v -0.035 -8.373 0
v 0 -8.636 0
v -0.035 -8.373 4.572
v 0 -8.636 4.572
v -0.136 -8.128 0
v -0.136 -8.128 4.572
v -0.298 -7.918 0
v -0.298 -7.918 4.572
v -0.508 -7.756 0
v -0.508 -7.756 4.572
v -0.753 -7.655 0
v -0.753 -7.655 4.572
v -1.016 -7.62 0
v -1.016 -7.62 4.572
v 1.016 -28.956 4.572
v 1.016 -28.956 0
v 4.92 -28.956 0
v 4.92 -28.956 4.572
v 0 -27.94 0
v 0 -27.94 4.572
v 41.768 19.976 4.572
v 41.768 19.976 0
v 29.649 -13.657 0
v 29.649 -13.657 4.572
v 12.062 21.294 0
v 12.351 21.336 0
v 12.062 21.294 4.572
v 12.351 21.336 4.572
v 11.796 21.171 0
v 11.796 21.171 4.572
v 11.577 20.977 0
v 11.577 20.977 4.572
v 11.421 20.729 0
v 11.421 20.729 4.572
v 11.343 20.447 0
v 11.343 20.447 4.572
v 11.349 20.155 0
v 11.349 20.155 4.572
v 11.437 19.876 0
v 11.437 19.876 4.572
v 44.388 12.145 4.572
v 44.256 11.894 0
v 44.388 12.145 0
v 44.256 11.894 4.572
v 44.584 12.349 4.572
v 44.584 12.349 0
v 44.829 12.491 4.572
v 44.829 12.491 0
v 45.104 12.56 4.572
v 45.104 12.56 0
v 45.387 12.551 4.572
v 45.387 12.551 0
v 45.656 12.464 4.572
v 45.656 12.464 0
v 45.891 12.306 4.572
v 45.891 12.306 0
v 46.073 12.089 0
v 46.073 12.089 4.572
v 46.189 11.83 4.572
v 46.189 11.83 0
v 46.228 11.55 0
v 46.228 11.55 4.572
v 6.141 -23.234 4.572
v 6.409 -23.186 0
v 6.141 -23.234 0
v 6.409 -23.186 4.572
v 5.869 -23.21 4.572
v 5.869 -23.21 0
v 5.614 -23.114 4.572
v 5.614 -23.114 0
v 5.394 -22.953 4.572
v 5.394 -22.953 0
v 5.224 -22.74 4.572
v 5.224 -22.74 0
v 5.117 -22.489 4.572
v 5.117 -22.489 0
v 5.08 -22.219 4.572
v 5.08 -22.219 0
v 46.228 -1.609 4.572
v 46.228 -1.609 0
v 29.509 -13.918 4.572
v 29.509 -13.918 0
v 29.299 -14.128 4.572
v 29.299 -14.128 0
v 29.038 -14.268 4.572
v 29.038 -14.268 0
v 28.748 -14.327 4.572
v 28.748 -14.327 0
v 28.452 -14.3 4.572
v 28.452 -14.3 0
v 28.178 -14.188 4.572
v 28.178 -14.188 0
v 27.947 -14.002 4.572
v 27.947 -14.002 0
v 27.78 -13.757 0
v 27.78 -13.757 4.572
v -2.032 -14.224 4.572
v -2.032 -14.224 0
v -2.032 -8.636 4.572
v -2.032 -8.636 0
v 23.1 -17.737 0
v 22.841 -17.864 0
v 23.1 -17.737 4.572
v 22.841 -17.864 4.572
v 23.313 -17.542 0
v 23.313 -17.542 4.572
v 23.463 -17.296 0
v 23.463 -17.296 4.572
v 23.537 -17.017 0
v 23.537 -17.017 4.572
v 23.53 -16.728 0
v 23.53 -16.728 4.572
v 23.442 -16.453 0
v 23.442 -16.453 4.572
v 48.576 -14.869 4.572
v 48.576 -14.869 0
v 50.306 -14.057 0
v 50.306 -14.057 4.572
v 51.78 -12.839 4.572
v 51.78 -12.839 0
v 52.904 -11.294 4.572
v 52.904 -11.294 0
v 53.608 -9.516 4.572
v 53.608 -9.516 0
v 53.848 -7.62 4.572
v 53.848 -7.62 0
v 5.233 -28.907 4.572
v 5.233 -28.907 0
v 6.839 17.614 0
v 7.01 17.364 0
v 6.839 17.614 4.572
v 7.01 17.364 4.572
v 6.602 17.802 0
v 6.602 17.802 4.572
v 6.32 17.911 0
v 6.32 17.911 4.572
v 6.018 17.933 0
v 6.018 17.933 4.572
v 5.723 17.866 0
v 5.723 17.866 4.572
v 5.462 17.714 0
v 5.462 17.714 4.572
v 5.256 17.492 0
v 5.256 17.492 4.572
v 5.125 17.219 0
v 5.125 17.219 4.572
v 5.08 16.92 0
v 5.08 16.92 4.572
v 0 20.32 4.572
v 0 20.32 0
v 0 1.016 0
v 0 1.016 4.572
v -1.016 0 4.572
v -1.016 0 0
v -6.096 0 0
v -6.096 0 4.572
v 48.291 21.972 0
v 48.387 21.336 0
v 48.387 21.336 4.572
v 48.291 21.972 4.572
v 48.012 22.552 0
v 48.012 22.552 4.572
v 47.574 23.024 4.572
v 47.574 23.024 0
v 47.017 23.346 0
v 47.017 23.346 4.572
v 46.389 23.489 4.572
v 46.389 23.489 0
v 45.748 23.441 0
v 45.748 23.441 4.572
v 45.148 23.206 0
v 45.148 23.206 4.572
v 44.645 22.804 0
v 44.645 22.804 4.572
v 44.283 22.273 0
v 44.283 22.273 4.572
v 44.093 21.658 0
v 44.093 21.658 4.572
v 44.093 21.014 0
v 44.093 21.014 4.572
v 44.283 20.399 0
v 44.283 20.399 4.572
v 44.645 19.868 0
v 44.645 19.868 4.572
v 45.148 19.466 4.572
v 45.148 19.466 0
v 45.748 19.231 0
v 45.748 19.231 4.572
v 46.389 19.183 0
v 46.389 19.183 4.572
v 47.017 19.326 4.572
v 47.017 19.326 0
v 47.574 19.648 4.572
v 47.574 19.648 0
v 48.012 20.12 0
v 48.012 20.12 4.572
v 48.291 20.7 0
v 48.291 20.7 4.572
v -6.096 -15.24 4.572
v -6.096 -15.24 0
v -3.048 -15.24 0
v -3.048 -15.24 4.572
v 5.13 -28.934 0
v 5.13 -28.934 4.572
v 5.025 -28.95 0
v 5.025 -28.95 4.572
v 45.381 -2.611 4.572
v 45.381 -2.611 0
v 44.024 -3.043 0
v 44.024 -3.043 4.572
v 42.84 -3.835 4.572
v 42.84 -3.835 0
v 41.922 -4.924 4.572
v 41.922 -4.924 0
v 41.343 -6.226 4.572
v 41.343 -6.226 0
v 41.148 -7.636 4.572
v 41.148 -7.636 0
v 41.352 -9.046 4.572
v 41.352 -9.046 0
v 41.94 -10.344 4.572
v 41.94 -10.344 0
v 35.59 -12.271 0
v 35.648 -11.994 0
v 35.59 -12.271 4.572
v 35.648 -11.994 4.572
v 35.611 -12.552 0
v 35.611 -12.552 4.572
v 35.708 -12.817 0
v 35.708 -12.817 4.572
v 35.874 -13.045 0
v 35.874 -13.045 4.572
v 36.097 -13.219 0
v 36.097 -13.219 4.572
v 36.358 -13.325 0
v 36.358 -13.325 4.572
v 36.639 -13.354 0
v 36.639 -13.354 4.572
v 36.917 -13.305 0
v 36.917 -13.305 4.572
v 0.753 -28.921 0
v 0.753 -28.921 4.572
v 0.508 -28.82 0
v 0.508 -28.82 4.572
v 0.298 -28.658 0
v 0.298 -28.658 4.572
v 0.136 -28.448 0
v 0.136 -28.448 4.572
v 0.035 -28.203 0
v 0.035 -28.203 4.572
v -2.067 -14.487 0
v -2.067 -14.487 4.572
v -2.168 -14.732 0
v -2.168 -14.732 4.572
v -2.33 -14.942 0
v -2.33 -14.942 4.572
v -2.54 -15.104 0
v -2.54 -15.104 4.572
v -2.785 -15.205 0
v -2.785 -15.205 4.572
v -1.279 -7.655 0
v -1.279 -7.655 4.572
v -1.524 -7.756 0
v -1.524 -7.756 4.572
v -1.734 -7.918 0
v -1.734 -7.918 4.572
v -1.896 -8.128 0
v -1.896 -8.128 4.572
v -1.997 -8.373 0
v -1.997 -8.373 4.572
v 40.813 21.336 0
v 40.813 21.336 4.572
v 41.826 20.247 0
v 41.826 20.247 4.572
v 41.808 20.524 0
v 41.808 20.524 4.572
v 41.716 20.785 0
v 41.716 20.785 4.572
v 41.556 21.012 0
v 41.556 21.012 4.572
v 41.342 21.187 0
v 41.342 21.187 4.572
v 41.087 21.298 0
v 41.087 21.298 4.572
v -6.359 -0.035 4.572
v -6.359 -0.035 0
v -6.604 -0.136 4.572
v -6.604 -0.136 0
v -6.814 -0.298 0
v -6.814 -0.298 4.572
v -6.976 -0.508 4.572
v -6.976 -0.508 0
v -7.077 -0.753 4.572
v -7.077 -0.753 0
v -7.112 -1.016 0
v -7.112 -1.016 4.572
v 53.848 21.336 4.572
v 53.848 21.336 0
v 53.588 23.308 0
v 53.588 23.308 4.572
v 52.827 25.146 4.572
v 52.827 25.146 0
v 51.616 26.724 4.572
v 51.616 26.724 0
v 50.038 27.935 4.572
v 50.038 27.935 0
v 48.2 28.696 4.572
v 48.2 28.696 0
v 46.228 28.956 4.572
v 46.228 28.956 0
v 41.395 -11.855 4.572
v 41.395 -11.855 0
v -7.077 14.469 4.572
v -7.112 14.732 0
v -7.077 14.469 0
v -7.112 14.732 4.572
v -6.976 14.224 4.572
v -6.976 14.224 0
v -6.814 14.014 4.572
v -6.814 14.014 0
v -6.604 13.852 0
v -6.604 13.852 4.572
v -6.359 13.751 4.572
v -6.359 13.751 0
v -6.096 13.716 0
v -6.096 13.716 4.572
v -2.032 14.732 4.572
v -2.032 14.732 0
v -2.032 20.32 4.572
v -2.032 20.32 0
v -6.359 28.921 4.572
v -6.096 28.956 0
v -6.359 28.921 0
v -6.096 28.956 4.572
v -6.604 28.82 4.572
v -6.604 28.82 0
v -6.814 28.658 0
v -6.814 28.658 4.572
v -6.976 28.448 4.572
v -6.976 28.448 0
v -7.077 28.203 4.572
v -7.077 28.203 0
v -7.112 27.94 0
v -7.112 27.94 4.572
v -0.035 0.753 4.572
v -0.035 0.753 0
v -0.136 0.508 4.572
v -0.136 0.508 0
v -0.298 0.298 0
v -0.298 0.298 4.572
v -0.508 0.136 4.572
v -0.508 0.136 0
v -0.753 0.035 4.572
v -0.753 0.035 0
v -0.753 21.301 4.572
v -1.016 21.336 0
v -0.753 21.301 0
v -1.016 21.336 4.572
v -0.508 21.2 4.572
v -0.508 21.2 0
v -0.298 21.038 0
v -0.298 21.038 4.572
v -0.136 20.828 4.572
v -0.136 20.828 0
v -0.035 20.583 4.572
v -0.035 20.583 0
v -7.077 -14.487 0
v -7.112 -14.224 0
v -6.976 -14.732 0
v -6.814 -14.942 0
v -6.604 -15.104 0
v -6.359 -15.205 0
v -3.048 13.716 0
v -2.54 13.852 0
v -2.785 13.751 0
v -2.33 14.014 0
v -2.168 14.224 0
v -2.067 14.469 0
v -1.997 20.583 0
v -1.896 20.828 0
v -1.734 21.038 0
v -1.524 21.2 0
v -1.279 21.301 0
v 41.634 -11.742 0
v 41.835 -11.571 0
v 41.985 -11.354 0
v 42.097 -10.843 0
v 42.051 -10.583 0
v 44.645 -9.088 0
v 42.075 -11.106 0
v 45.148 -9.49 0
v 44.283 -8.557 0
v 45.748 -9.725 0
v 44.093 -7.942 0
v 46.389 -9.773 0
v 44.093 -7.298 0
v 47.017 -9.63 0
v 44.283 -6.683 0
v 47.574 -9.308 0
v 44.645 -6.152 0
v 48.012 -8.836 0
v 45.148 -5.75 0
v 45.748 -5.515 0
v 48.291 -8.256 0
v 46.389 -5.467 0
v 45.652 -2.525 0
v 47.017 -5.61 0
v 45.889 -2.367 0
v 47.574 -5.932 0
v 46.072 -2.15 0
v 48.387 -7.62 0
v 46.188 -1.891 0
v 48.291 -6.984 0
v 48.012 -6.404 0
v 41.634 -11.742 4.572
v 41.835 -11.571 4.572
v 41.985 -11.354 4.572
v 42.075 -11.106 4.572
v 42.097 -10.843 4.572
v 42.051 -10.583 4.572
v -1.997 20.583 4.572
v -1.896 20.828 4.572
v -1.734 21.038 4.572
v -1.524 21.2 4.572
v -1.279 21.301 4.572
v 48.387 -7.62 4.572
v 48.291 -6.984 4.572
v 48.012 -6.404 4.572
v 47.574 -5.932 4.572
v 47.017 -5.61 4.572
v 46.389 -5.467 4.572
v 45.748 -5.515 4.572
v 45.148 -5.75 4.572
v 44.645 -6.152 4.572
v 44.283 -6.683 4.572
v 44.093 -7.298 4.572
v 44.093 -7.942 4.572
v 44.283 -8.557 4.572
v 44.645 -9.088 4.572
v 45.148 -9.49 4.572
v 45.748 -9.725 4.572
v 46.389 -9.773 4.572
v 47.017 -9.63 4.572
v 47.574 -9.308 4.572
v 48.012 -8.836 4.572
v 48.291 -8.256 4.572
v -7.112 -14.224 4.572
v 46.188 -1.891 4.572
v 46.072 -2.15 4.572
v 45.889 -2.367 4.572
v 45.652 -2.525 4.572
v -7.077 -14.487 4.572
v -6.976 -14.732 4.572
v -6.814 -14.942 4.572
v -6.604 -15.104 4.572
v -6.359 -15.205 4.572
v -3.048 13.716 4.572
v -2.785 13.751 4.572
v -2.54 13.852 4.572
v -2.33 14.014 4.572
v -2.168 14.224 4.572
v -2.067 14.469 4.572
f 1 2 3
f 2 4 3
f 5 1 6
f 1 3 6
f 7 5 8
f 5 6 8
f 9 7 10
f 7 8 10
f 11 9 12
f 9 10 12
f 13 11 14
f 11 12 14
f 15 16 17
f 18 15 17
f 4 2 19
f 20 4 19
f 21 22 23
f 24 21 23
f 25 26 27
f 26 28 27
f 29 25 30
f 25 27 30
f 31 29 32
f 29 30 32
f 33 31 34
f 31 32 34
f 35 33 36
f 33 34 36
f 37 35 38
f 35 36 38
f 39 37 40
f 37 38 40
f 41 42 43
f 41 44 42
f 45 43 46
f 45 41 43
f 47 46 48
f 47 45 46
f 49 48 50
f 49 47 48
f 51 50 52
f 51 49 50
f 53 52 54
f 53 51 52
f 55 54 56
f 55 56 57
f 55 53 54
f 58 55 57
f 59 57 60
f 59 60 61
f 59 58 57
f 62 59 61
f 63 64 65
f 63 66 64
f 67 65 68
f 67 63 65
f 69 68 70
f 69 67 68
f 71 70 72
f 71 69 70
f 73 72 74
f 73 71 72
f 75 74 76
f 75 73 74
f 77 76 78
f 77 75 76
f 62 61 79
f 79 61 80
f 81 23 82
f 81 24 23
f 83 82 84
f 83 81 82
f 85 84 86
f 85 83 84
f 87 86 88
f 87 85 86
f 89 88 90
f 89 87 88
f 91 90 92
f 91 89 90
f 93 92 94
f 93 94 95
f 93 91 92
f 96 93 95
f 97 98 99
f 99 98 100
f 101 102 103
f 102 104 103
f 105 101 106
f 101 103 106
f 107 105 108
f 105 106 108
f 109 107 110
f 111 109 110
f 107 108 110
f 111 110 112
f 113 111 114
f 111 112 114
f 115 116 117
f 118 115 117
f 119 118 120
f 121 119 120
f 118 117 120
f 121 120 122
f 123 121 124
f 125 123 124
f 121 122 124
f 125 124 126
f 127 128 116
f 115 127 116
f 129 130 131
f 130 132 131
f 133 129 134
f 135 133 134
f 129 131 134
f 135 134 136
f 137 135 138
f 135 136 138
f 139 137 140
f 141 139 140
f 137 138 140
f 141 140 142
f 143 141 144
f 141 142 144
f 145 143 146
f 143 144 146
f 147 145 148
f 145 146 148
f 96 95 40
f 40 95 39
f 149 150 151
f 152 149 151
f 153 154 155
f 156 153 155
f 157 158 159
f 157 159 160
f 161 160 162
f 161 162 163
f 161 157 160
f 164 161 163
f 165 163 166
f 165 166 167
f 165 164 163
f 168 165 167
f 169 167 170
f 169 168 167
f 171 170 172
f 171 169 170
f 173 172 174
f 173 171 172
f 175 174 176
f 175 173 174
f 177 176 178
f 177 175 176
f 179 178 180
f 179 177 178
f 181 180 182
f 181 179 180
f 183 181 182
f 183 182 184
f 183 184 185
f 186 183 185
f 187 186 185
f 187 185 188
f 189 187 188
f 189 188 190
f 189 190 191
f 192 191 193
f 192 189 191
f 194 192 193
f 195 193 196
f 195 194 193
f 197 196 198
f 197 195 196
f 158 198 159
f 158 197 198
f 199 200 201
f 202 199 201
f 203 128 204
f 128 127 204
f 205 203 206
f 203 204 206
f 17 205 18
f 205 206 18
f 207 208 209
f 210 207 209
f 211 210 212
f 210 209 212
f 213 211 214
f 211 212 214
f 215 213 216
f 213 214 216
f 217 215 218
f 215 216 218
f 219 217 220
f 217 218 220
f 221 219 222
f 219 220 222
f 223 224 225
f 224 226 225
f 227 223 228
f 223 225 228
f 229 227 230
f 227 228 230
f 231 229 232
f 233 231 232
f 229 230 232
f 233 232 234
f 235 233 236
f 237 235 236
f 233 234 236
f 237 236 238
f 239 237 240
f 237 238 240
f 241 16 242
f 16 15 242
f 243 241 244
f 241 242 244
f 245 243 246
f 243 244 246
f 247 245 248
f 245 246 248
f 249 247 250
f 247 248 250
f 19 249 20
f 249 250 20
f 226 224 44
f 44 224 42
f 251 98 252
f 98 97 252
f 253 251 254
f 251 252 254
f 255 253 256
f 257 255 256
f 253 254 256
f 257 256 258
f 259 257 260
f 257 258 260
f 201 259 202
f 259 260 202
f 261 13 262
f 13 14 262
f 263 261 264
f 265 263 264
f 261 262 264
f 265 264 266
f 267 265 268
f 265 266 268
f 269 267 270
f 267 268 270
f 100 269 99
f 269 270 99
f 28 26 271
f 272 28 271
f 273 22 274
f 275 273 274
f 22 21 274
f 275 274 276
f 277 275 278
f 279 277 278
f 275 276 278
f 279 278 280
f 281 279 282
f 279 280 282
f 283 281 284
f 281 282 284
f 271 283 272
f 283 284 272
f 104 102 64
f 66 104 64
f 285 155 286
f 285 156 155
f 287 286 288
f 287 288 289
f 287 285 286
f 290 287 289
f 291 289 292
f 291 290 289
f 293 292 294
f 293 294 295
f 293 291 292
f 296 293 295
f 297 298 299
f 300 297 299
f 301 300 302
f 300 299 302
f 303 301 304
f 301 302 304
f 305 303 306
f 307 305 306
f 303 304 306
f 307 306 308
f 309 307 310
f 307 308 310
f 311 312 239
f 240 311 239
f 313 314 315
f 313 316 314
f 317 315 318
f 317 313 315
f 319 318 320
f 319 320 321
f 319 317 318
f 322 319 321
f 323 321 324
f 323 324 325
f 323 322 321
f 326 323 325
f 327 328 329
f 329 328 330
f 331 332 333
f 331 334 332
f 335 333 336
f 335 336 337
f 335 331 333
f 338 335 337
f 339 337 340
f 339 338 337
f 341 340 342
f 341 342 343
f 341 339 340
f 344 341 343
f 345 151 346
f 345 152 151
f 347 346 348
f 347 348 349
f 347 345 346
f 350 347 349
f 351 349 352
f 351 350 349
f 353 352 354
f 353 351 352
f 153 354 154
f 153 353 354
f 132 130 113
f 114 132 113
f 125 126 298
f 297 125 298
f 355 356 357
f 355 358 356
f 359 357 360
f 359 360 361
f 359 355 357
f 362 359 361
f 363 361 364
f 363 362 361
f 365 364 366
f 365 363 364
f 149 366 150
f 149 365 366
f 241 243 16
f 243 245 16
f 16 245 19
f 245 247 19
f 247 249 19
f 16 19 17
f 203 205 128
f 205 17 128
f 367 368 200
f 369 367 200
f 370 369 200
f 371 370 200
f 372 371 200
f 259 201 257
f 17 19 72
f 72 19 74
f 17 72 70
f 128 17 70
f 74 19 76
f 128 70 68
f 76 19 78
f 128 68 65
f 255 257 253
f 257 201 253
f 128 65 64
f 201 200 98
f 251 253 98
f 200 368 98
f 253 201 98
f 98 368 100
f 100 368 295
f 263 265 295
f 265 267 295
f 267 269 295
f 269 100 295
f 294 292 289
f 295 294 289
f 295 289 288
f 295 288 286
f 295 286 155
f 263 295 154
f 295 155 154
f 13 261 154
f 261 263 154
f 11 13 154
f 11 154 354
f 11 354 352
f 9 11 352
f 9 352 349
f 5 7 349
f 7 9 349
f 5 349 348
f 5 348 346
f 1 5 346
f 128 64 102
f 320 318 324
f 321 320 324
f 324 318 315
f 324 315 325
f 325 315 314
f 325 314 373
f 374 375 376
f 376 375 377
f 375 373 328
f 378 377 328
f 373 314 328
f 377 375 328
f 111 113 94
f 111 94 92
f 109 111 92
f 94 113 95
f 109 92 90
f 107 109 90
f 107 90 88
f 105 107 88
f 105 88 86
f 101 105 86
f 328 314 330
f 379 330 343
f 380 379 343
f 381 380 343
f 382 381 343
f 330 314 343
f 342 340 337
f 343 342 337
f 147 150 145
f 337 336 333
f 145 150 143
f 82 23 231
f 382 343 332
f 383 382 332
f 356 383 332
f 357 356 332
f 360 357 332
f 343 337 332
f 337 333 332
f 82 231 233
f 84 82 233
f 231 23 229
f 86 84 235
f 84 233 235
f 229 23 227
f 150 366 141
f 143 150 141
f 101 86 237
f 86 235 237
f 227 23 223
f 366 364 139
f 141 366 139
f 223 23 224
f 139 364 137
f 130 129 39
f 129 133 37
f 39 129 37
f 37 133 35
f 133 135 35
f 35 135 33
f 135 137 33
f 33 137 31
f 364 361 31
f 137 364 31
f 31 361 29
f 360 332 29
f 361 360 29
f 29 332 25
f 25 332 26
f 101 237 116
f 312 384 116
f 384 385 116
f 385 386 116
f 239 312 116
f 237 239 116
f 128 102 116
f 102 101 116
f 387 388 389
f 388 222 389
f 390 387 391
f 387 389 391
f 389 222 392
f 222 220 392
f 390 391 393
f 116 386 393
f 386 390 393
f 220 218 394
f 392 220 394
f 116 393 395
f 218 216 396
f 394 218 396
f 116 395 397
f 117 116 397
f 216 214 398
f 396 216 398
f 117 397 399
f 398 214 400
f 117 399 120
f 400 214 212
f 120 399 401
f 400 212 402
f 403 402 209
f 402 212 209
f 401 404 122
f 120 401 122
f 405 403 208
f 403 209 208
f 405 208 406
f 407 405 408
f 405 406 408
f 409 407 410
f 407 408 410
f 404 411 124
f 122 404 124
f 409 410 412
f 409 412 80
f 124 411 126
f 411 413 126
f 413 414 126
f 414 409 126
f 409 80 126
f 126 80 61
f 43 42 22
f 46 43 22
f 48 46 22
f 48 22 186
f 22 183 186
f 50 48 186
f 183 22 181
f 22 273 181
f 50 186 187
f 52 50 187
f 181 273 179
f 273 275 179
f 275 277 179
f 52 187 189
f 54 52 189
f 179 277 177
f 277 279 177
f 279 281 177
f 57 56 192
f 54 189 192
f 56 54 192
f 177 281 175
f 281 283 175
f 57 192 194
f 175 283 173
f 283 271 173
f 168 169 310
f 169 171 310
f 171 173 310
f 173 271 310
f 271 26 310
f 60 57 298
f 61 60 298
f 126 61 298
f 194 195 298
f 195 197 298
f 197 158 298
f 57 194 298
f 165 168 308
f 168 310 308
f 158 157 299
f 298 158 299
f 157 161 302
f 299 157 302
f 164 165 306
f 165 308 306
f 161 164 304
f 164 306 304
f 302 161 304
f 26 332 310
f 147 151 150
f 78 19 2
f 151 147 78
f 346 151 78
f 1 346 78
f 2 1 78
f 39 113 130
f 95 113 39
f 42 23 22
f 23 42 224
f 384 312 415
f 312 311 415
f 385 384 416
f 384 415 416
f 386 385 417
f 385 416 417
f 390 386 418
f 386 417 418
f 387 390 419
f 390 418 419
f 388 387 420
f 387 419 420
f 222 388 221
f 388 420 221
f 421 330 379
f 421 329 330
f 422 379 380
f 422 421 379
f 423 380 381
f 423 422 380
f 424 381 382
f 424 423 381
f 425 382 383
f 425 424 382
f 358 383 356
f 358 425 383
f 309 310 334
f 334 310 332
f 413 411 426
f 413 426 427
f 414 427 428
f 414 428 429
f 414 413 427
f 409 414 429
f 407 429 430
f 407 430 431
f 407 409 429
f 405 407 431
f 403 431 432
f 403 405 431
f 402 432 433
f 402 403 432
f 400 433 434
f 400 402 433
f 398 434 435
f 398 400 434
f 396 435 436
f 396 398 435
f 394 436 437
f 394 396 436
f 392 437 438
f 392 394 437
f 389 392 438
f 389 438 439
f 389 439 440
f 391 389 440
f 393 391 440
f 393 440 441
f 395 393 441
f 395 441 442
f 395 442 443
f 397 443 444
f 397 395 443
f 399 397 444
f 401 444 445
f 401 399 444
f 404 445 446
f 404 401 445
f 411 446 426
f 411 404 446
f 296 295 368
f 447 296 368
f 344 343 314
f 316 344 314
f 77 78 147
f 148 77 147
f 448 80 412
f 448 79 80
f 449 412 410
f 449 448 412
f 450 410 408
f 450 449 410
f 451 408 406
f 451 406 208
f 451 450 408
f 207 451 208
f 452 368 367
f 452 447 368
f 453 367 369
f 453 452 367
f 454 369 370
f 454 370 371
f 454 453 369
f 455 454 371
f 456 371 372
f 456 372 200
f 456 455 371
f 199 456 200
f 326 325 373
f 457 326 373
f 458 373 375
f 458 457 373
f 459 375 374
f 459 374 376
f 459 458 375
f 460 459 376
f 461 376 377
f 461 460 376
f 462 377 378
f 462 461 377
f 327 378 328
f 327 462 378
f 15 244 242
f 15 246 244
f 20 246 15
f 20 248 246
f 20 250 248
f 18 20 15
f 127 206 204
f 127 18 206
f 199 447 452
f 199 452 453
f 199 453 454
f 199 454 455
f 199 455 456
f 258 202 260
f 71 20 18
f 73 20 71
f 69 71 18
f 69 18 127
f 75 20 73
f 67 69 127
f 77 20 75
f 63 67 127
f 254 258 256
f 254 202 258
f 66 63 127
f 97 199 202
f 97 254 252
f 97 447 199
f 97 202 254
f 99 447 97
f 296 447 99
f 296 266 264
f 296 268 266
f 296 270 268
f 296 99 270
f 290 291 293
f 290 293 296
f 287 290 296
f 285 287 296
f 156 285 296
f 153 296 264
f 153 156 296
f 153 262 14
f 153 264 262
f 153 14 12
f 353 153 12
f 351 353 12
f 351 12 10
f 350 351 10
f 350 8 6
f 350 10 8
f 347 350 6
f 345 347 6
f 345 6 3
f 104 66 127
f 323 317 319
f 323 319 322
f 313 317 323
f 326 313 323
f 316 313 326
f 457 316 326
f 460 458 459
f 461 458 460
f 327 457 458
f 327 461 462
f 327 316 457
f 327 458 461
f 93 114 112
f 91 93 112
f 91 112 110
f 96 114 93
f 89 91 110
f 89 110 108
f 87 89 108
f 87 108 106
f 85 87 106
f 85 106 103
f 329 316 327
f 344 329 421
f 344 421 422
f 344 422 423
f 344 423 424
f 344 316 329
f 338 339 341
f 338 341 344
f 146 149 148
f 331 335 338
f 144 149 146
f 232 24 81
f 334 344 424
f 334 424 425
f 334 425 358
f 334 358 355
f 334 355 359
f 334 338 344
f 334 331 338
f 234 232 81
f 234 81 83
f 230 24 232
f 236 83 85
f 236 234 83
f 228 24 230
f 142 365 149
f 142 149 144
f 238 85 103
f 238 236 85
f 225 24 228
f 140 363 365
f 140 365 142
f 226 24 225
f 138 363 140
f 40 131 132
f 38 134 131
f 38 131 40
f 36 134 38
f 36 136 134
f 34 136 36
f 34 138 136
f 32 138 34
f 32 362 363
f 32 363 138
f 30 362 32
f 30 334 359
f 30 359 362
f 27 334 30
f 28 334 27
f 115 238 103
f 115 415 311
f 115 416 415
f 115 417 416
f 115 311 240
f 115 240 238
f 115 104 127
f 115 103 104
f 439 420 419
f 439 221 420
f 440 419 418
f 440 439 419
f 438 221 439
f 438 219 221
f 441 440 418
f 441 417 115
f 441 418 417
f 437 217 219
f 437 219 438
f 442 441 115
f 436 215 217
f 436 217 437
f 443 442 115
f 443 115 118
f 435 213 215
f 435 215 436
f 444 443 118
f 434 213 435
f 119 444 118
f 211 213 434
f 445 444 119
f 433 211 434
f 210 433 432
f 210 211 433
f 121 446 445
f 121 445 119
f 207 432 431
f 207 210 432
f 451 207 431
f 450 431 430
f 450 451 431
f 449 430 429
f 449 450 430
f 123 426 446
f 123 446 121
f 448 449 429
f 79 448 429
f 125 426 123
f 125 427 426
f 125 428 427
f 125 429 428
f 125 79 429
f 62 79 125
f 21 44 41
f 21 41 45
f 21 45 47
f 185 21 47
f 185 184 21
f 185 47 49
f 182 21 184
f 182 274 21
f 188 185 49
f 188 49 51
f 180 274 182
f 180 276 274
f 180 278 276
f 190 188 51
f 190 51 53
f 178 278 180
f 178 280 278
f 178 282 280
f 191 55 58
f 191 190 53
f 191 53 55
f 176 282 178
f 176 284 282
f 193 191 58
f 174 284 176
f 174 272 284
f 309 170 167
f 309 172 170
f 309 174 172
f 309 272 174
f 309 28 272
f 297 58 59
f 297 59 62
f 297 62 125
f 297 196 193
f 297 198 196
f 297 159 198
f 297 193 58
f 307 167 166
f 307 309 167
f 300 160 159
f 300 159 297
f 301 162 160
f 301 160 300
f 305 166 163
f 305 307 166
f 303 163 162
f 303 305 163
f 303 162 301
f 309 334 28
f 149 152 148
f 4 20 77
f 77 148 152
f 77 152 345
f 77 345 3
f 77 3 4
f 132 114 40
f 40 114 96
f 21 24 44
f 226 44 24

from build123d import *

# Parameters (mm, degrees)
F0_R     = 2.159
F1_DEPTH = 4.572
F2_R     = 1.01599


# Not quite as in the source:
# - a fillet or chamfer is up to 0.001 mm smaller than in the source, because OpenCascade refuses the exact size


with BuildPart() as f1:
    # F0 (on Top) → F1 (new body)
    with BuildSketch(Plane.XY):
        with BuildLine():
            Line((46.228, 28.956), (-7.112, 28.956))
            Line((-7.112, 28.956), (-7.112, 13.716))
            Line((-7.112, 13.716), (-2.032, 13.716))
            Line((-2.032, 13.716), (-2.032, 21.336))
            Line((-2.032, 21.336), (0, 21.336))
            Line((0, 21.336), (0, 0))
            Line((0, 0), (-7.112, 0))
            Line((-7.112, 0), (-7.112, -15.24))
            Line((-7.112, -15.24), (-2.032, -15.24))
            Line((-2.032, -15.24), (-2.032, -7.62))
            Line((-2.032, -7.62), (0, -7.62))
            Line((0, -7.62), (0, -28.956))
            Line((0, -28.956), (5.08, -28.956))
            Line((5.08, -28.956), (48.5757837838, -14.8692972973))
            ThreePointArc((48.5757837838, -14.8692972973), (52.3905689624, -12.1018683363), (53.848, -7.62))
            Line((53.848, -7.62), (53.848, 21.336))
            ThreePointArc((53.848, 21.336), (51.6161536726, 26.7241536726), (46.228, 28.956))
        make_face()
        Polygon((5.08, -23.6162272727), (5.08, 21.336), (23.9526054243, -17.5040766524), align=None, mode=Mode.SUBTRACT)
        with Locations((46.228, -7.62)):
            Circle(F0_R, mode=Mode.SUBTRACT)
        Polygon((28.8326085769, -15.9236210859), (10.7279551462, 21.336), (42.2585858686, 21.336), align=None, mode=Mode.SUBTRACT)
        with BuildLine():
            Line((46.228, 17.3665858686), (46.228, -2.54))
            ThreePointArc((46.228, -2.54), (41.4862817332, -5.7972252255), (42.8252108486, -11.391926032))
            Line((42.8252108486, -11.391926032), (34.9457461194, -13.9437981318))
            Line((34.9457461194, -13.9437981318), (46.228, 17.3665858686))
        make_face(mode=Mode.SUBTRACT)
        with Locations((46.228, 21.336)):
            Circle(F0_R, mode=Mode.SUBTRACT)
    extrude(amount=F1_DEPTH)

    # F2 (radius 1.016 in the source; OpenCascade refuses exactly that, so slightly less here)
    f2_edges = [f1.edges().sort_by_distance(p)[0] for p in [
        (46.228, 17.366586, 2.286),
        (5.08, 21.336, 2.286),
        (10.727955, 21.336, 2.286),
        (42.258586, 21.336, 2.286),
        (23.952605, -17.504077, 2.286),
        (5.08, -23.616227, 2.286),
        (28.832609, -15.923621, 2.286),
        (46.228, -2.54, 2.286),
        (42.825211, -11.391926, 2.286),
        (34.945746, -13.943798, 2.286),
        (5.08, -28.956, 2.286),
        (0, -28.956, 2.286),
        (0, -7.62, 2.286),
        (-2.032, -7.62, 2.286),
        (-2.032, -15.24, 2.286),
        (-7.112, -15.24, 2.286),
        (0, 21.336, 2.286),
        (-2.032, 13.716, 2.286),
        (-7.112, 13.716, 2.286),
        (-7.112, 0, 2.286),
        (0, 0, 2.286),
        (-2.032, 21.336, 2.286),
        (-7.112, 28.956, 2.286),
    ]]
    fillet(f2_edges, radius=F2_R)


solid = f1.part
